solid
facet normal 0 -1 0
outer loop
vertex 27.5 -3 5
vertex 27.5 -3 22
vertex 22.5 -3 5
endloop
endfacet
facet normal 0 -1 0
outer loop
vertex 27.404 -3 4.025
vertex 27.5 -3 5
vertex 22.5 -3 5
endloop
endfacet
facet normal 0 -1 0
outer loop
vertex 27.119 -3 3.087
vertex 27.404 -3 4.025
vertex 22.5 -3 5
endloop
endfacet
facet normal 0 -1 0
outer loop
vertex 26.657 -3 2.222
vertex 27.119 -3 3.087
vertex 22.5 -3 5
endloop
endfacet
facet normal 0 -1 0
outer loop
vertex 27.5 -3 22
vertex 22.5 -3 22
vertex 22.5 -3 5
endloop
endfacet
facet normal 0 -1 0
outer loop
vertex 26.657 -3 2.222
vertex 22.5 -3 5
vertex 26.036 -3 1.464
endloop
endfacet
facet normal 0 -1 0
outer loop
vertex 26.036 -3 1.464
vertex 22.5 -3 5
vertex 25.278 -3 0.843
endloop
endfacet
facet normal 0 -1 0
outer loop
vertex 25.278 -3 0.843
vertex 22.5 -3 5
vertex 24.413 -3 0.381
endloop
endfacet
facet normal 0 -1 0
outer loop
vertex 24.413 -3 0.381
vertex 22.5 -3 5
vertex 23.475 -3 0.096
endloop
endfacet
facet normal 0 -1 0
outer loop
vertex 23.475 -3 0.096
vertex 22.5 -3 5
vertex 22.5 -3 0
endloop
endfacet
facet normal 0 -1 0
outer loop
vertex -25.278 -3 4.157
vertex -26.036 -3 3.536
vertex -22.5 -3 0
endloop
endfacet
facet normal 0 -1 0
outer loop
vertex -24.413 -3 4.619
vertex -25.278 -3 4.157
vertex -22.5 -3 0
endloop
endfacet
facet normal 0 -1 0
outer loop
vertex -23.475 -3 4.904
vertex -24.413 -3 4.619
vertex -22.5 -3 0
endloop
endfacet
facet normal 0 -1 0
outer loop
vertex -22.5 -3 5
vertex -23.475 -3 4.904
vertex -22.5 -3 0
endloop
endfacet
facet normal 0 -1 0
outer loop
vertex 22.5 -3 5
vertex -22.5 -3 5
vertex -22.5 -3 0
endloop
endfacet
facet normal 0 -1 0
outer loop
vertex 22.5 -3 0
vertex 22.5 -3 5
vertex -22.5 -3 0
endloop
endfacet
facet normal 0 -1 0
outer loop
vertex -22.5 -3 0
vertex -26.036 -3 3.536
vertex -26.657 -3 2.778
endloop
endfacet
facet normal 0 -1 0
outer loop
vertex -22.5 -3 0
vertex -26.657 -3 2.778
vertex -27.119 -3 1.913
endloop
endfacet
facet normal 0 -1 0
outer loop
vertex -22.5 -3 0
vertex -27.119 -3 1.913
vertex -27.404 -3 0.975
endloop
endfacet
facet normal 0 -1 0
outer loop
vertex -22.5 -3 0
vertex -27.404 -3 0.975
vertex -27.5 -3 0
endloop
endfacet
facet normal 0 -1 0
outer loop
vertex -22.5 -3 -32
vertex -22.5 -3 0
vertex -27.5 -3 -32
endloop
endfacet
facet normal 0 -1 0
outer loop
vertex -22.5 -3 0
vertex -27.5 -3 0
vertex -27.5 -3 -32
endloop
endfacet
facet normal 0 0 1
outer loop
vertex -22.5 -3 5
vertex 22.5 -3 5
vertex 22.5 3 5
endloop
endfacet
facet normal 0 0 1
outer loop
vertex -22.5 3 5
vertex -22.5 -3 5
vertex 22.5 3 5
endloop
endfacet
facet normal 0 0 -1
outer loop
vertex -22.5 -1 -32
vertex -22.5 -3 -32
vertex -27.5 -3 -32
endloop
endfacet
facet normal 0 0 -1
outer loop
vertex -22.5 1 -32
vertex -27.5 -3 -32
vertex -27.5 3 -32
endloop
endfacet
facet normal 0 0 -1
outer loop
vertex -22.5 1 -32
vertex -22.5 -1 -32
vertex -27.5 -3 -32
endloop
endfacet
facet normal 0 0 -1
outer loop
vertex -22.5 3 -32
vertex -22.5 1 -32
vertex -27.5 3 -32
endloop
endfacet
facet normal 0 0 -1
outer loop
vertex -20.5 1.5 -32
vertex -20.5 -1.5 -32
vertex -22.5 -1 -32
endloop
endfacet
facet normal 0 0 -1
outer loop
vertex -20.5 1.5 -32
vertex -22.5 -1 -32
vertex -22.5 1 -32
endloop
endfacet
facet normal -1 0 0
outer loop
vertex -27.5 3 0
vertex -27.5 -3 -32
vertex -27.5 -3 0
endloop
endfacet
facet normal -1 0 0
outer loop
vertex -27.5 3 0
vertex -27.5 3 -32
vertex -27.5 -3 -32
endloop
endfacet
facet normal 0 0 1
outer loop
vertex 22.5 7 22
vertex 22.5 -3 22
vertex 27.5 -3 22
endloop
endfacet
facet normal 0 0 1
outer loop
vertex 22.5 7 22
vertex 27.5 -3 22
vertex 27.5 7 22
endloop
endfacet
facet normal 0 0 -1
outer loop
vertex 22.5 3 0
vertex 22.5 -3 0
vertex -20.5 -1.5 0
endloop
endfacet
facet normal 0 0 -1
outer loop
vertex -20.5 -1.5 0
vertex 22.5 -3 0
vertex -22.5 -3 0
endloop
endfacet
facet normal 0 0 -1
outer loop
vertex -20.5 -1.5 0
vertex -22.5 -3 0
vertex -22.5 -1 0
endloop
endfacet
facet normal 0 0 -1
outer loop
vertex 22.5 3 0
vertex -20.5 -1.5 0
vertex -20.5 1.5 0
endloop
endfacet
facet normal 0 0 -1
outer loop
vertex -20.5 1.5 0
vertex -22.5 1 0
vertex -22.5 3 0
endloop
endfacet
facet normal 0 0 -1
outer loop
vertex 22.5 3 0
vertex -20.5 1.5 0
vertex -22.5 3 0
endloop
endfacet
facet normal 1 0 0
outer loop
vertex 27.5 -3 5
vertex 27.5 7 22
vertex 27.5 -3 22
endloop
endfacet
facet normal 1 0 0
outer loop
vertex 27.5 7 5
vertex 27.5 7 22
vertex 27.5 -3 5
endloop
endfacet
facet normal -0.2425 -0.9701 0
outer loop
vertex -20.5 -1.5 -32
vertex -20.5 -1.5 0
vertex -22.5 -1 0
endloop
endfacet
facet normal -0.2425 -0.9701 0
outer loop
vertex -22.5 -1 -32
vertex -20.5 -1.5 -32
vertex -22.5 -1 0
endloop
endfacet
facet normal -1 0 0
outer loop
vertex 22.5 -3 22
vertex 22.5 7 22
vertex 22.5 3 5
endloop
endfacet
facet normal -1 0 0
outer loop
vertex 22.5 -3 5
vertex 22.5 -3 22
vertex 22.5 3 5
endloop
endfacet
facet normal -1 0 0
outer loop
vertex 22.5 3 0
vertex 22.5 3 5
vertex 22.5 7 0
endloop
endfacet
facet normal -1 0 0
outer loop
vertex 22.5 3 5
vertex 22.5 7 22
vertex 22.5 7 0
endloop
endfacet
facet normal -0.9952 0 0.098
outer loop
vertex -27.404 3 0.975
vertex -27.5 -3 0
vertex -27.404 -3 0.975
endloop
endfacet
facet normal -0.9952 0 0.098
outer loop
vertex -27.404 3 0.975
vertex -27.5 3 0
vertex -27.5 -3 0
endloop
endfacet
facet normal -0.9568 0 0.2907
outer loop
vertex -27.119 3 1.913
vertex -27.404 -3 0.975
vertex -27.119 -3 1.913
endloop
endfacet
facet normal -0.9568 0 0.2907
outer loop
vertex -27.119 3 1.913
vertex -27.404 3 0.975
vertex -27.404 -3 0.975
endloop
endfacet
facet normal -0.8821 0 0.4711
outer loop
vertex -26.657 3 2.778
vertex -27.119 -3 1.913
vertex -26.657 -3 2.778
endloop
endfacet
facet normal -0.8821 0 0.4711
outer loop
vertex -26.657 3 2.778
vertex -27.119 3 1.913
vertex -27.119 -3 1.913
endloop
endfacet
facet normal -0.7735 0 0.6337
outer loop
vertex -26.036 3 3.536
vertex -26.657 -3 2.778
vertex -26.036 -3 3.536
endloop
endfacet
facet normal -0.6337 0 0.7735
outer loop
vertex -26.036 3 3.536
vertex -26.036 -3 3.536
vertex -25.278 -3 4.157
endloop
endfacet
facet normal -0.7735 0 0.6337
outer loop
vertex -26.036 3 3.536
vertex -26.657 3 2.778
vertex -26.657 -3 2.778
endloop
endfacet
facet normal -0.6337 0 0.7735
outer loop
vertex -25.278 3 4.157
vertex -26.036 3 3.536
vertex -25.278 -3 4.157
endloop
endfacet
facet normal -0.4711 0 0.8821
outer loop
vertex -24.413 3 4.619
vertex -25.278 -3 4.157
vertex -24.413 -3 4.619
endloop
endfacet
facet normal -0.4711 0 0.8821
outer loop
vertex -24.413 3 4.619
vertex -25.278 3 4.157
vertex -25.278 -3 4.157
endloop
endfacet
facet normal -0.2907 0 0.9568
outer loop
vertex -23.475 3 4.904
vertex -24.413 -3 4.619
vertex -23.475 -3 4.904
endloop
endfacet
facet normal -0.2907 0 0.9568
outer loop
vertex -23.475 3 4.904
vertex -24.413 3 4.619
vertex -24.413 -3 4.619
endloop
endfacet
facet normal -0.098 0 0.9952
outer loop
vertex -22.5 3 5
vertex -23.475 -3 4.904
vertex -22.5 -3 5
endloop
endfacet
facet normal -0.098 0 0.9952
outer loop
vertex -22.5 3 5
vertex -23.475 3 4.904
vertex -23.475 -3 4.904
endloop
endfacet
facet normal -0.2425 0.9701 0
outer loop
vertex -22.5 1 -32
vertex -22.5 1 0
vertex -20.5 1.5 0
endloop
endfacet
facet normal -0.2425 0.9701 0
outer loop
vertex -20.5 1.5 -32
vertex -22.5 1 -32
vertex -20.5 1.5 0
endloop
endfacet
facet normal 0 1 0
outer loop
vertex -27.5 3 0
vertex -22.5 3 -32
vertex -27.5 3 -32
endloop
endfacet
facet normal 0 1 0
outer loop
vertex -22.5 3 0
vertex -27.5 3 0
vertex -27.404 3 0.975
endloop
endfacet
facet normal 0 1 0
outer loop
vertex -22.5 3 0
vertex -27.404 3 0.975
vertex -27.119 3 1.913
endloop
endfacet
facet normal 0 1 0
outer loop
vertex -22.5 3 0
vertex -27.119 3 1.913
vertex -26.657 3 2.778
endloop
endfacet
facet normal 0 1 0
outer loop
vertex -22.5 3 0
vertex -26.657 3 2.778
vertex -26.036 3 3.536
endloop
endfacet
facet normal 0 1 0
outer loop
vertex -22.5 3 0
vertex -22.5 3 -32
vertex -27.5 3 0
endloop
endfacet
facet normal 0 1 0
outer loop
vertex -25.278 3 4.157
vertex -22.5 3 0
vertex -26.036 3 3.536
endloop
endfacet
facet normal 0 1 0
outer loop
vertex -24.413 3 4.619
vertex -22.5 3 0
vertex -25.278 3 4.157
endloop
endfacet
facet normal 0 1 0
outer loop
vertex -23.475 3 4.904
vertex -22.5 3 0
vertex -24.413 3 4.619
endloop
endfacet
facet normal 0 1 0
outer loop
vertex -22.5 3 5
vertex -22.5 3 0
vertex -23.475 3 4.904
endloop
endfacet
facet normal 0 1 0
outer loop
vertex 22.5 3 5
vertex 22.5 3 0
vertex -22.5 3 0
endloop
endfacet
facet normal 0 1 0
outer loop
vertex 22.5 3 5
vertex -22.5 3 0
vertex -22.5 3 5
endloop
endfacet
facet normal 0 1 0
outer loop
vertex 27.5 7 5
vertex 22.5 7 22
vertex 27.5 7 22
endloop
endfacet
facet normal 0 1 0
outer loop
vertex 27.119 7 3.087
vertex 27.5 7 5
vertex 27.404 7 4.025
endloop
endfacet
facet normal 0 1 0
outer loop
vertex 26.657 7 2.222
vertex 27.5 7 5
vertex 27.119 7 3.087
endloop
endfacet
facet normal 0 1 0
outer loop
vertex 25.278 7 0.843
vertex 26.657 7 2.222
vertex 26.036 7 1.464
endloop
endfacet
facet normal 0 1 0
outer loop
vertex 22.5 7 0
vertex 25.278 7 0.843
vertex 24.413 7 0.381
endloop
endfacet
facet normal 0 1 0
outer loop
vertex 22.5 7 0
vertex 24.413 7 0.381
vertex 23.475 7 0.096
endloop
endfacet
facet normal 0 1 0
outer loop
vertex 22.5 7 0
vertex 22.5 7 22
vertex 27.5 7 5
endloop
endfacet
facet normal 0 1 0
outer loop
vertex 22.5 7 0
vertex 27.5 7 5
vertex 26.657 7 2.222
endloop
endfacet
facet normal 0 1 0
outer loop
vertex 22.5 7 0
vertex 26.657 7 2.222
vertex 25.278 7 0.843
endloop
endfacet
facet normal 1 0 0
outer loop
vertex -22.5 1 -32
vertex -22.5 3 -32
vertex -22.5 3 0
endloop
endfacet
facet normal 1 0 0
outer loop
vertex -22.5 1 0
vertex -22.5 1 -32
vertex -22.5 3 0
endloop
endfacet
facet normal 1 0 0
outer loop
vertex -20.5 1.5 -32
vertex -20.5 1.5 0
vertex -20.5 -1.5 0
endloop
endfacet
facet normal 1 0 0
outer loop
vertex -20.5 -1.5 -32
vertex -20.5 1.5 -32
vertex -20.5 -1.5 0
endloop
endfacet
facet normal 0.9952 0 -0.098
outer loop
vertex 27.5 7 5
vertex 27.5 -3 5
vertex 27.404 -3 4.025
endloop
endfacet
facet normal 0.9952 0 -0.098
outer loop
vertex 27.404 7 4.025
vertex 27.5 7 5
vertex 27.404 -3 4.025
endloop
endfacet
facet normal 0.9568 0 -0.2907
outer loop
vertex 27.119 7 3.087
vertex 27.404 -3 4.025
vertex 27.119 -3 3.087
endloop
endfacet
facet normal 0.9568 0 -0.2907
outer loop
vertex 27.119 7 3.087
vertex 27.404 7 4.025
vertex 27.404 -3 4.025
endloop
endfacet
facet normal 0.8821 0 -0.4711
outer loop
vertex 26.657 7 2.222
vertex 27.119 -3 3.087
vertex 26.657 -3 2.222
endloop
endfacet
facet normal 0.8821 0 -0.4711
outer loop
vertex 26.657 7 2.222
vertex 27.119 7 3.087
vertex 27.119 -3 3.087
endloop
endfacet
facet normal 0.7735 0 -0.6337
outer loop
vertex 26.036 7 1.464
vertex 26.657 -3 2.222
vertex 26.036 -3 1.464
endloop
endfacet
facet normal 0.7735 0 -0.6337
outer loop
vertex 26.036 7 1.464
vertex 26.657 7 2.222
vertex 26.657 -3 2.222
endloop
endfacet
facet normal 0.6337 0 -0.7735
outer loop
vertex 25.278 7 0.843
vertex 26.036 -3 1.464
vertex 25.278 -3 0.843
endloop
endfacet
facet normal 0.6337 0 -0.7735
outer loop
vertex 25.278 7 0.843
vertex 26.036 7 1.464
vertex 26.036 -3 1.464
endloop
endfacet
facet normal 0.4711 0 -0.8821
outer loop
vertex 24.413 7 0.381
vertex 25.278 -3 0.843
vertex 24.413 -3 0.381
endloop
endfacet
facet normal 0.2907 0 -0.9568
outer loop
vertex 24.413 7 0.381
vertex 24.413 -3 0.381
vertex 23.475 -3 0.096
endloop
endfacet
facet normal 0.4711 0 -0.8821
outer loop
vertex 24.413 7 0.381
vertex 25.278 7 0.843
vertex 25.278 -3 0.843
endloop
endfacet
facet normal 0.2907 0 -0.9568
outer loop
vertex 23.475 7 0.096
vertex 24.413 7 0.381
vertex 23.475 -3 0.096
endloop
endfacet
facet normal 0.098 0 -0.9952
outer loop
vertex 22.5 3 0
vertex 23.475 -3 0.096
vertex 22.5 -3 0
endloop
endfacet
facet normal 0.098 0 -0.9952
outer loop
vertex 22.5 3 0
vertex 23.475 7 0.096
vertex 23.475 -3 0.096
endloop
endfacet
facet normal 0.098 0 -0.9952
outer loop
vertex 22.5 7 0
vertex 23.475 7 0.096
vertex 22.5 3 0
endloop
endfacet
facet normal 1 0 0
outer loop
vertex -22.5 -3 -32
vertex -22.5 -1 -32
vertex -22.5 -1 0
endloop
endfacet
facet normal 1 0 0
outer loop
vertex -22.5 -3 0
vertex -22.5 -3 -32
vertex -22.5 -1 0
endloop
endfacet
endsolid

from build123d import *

# Parameters (mm, degrees)
SKETCH1_W           = 45
SKETCH1_H           = 6
BOSS_EXTRUDE1_DEPTH = 5
SKETCH2_W           = 37
SKETCH2_H           = 6
BOSS_EXTRUDE2_DEPTH = 5
FILLET1_R           = 5
SKETCH3_W           = 22
SKETCH3_H           = 10
BOSS_EXTRUDE3_DEPTH = 5
FILLET2_R           = 5
BOSS_EXTRUDE4_DEPTH = 32


with BuildPart() as part:
    # Sketch1 → Boss-Extrude1 (new body)
    with BuildSketch(Plane.XY):
        Rectangle(SKETCH1_W, SKETCH1_H)
    extrude(amount=BOSS_EXTRUDE1_DEPTH)

    # Sketch2 → Boss-Extrude2 (add)
    with BuildSketch(Plane.ZY.offset(22.5)):
        with Locations((-13.5, 0)):
            Rectangle(SKETCH2_W, SKETCH2_H)
    extrude(amount=BOSS_EXTRUDE2_DEPTH)

    # Fillet1
    fillet1_edges = [part.edges().sort_by_distance(p)[0] for p in [
        (-27.5, 0, 5),
    ]]
    fillet(fillet1_edges, radius=FILLET1_R)

    # Sketch3 → Boss-Extrude3 (add)
    with BuildSketch(Plane(origin=(22.5, 0, 0), x_dir=(0, 0, -1), z_dir=(1, 0, 0))):
        with Locations((-11, 2)):
            Rectangle(SKETCH3_W, SKETCH3_H)
    extrude(amount=BOSS_EXTRUDE3_DEPTH)

    # Fillet2
    fillet2_edges = [part.edges().sort_by_distance(p)[0] for p in [
        (27.5, 2, 0),
    ]]
    fillet(fillet2_edges, radius=FILLET2_R)

    # Sketch5 → Boss-Extrude4 (add)
    with BuildSketch(Plane(origin=(0, 0, 0), x_dir=(-1, 0, 0), z_dir=(0, 0, -1))):
        Polygon((22.5, 1), (20.5, 1.5), (20.5, -1.5), (22.5, -1), align=None)
    extrude(amount=BOSS_EXTRUDE4_DEPTH)


solid = part.part
